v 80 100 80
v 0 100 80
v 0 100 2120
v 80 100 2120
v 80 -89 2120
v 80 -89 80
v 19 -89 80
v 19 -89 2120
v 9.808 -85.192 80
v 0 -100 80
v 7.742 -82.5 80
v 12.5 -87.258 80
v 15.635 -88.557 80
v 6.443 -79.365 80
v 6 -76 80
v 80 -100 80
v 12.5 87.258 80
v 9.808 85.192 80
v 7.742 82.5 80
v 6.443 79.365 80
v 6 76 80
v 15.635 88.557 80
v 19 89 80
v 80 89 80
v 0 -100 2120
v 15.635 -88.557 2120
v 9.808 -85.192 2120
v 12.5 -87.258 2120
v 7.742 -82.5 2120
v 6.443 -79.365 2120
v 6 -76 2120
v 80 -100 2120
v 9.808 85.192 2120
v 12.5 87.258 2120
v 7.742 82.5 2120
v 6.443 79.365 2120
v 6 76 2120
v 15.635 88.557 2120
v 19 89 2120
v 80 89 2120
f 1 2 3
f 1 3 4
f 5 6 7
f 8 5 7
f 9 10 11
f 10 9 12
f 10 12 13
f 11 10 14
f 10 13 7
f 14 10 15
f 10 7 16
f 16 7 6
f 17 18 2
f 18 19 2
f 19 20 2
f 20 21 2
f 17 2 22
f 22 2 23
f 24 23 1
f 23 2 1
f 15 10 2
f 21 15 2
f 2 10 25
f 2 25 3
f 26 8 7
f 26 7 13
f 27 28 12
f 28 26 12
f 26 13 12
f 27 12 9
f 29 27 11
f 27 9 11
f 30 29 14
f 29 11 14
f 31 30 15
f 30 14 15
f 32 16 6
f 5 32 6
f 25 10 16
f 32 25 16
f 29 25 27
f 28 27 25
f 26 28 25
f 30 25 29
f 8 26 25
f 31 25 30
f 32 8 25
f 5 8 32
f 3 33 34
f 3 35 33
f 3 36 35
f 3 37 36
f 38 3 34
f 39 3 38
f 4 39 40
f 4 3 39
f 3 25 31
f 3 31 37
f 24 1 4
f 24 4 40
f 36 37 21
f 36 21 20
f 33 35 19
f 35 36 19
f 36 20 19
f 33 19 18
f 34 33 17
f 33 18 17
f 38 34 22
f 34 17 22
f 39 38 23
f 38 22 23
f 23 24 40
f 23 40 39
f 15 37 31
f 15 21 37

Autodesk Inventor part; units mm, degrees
ref_plane "Start plane" through (0, 0, 80) normal (0, 0, 1) x (1, 0, 0)
ref_plane "End plane" through (0, 0, 2120) normal (0, 0, 1) x (1, 0, 0)
sketch "Sketch" plane through (0, 0, 0) normal (0, 0, 1) x (1, 0, 0)
  line L0 (0, 0) -> (0, 100)
  line L1 (0, 100) -> (80, 100)
  line L2 (80, 100) -> (80, 89)
  line L3 (80, 89) -> (19, 89)
  line L4 (6, 76) -> (6, 0)
  line L5 (6, 0) -> (0, 0) construction
  line L6 (25.6, 100) -> (25.6, 89) construction
  line L7 (80, 89) -> (80, 89) construction
  line L8 (80, 89) -> (25.6, 89) construction
  line L9 (0, 12) -> (0, -30) construction
  line L10 (-1.5, 0) -> (19.5, 0) construction
  line L11 (0, 0) -> (0, -100)
  line L12 (0, -100) -> (80, -100)
  line L13 (80, -100) -> (80, -89)
  line L14 (80, -89) -> (19, -89)
  line L15 (6, -76) -> (6, 0)
  arc A0 (6, -76) -> (19, -89) centre (19, -76) ccw
  arc A1 (19, 89) -> (6, 76) centre (19, 76) ccw
  line L16 (0, 140) -> (0, -140) construction
  line L17 (-17.8, 0) -> (96.3, 0) construction
  point P0 (6, 89)
  point P1 (6, -89)
  point P2 (25.6, -100)
  point P3 (25.6, -89)
  dimension "d0" = 6
  dimension "d1" = 100
  dimension "d2" = 80
  dimension "d3" = 11
  dimension "d5" = 0
  dimension "d23" = 13
  dimension "d24" = 0
  dimension "d29" = 25.6
extrude "Body" add sketch "Sketch" along normal up to surface (2040 mm away) from surface at 80
sketch "Sketch3" plane through (0, 0, 0) normal (0, 0, 1) x (1, 0, 0)
  line L0 (0, 0) -> (10, 0)
ref_plane "Work Plane3" through (0, 0, 0) normal (0, -1, 0) x (1, 0, 0)
sketch "Sketch4" plane through (0, 0, 0) normal (0, -1, 0) x (1, 0, 0)
  line L0 (-2, 80) -> (12, 80)
  line L1 (-2, 2120) -> (12, 2120)
  dimension "d28" = 2040
ref_plane "Work Plane4" through (-3520, 0, 80) normal (0, 0, -1) x (-1, 0, 0)
split "Split1" plane through (-3520, 0, 80) removes the side toward (0, 0, -1)
ref_plane "Work Plane5" through (80, 0, 2120) normal (0, 0, 1) x (1, 0, 0)
split "Split2" plane through (80, 0, 2120) removes the side toward (0, 0, 1)
equation "\"d0\" = G_T"
equation "\"d1\" = 0.5 * G_H"
equation "\"d2\" = G_W"
equation "\"d3\" = G_T1"
equation "\"d23\" = G_IR"
equation "\"d29\" = G_C"
equation "\"d6\" = G_L"
equation "\"G_W\" = 80"
equation "\"G_H\" = 200"
equation "\"G_T\" = 6"
equation "\"G_T1\" = 11"
equation "\"G_NG\" = 0"
equation "\"G_IR\" = 13"
equation "\"G_C\" = 25.6"
equation "\"G_L\" = d28"
equation "\"ex\" = 0"
properties part number "DIN 1026-2 - UPE 200 - 2040" material "Steel, Mild"
